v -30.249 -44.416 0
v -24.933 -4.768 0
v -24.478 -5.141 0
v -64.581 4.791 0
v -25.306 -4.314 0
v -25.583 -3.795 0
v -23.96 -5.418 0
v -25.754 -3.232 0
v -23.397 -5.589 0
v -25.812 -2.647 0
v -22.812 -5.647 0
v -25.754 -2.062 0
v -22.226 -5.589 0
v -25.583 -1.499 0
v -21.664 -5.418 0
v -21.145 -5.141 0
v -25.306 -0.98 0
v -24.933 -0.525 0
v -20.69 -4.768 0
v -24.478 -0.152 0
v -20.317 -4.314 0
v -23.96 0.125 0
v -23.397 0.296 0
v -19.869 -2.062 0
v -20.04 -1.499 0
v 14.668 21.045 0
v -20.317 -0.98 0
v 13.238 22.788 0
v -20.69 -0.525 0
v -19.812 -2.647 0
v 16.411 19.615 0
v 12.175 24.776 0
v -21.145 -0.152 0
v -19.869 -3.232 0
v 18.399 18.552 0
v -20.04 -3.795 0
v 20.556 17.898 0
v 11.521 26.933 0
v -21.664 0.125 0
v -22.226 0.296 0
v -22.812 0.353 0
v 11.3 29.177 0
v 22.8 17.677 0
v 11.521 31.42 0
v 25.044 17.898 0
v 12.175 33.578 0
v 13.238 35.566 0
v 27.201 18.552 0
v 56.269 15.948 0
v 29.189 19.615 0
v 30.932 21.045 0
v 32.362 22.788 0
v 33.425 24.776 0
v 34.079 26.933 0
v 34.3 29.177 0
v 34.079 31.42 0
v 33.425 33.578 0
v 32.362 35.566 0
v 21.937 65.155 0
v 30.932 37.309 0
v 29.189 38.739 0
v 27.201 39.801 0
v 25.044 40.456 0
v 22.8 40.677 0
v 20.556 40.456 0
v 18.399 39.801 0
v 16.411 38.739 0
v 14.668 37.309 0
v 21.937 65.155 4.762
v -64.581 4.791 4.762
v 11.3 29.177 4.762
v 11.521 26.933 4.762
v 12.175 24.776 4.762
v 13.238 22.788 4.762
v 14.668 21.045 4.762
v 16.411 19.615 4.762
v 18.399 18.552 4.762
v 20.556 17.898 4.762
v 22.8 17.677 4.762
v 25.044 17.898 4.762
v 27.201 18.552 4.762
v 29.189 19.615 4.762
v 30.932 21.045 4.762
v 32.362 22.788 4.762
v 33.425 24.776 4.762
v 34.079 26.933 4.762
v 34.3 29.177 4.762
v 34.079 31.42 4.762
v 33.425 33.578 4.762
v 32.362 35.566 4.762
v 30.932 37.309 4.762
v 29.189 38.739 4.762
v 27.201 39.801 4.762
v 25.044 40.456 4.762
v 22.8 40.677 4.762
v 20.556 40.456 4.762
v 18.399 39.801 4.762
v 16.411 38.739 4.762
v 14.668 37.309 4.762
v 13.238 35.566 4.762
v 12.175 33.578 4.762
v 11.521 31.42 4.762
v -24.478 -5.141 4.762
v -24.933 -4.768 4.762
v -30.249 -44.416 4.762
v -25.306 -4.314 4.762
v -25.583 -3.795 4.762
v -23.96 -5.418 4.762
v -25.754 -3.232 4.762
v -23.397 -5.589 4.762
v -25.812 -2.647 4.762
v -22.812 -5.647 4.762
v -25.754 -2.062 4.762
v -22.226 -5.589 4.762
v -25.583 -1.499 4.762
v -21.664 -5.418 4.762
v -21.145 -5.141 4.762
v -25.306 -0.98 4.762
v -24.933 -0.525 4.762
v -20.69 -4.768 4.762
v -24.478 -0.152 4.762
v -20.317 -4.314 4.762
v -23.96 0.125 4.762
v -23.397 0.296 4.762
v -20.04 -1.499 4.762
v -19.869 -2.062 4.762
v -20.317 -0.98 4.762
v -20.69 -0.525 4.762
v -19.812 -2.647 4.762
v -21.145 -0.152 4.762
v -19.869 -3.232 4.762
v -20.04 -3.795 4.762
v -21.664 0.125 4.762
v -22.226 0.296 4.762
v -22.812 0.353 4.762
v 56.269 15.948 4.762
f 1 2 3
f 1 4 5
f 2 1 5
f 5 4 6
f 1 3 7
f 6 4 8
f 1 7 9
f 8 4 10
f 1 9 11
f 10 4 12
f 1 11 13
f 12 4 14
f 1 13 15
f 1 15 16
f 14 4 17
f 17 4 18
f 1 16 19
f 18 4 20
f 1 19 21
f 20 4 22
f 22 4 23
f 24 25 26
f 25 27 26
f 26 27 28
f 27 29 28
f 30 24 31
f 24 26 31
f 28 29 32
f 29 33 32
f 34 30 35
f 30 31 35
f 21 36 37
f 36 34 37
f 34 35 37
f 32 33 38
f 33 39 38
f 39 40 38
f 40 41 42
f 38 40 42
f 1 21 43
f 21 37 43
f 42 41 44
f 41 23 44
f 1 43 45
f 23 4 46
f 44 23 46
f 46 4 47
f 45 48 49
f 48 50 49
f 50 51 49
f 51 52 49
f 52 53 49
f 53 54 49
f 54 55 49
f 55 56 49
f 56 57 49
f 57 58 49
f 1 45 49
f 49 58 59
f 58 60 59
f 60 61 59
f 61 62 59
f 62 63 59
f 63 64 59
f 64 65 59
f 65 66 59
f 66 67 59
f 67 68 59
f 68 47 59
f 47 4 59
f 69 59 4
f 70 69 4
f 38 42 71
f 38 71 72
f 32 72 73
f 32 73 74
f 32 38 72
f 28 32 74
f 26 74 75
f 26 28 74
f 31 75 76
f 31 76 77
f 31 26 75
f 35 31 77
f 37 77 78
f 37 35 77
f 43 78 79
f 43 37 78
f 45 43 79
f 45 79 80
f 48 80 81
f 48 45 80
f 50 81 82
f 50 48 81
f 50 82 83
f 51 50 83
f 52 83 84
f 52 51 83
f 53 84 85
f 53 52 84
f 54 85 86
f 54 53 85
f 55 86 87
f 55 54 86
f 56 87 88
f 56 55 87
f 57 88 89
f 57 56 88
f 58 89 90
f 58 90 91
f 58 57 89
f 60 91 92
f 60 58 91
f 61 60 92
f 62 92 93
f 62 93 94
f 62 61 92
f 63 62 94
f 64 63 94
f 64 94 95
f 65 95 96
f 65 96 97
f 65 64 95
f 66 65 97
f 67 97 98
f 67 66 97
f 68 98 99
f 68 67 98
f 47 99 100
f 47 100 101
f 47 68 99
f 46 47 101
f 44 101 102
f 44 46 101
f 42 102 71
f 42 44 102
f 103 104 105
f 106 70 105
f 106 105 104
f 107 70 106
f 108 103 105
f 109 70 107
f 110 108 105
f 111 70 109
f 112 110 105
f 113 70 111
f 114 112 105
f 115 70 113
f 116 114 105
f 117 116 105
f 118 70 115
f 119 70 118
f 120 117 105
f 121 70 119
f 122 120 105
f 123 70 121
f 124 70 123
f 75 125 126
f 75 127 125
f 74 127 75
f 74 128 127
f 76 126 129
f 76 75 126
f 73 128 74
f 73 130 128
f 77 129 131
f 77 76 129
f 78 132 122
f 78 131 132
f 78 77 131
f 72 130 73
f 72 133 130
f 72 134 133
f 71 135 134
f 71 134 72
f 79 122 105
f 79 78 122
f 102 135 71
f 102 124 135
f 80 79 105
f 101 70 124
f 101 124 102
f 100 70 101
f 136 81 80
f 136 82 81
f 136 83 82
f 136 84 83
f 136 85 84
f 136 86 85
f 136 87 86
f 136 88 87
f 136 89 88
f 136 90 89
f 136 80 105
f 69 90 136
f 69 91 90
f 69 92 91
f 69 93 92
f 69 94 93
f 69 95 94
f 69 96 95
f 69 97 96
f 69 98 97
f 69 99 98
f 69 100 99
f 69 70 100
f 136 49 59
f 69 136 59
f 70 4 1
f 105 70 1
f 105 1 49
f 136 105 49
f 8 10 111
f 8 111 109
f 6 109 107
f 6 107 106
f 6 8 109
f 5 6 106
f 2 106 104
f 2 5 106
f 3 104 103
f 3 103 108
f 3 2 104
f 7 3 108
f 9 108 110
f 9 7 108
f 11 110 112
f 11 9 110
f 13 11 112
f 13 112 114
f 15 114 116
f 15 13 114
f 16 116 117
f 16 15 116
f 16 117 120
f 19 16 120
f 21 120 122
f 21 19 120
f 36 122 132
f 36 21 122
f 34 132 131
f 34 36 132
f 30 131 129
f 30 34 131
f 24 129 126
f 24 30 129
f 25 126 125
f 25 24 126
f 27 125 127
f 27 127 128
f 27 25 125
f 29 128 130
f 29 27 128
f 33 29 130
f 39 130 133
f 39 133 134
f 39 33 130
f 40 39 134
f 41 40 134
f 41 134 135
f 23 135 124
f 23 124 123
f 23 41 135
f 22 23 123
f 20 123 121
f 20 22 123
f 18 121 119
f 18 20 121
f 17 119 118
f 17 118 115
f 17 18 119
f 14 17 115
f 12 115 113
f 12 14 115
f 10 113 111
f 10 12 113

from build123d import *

# Parameters (mm, degrees)
SKETCH1_R           = 3
SKETCH1_R_2         = 11.5
BOSS_EXTRUDE1_DEPTH = 4.7625


with BuildPart() as part:
    # Sketch1 → Boss-Extrude1 (new body)
    with BuildSketch(Plane.XY):
        Polygon((21.936631743, 65.154612456), (-64.58116939, 4.790688487), (-30.249253249, -44.416216862), (56.268547885, 15.947707107), align=None)
        with Locations(Location((-22.811758645, -2.646806117, 0), (0, 0, 180))):
            Circle(SKETCH1_R, mode=Mode.SUBTRACT)
        with Locations(Location((22.800025974, 29.176775421, 0), (0, 0, 180))):
            Circle(SKETCH1_R_2, mode=Mode.SUBTRACT)
    extrude(amount=BOSS_EXTRUDE1_DEPTH)


solid = part.part
